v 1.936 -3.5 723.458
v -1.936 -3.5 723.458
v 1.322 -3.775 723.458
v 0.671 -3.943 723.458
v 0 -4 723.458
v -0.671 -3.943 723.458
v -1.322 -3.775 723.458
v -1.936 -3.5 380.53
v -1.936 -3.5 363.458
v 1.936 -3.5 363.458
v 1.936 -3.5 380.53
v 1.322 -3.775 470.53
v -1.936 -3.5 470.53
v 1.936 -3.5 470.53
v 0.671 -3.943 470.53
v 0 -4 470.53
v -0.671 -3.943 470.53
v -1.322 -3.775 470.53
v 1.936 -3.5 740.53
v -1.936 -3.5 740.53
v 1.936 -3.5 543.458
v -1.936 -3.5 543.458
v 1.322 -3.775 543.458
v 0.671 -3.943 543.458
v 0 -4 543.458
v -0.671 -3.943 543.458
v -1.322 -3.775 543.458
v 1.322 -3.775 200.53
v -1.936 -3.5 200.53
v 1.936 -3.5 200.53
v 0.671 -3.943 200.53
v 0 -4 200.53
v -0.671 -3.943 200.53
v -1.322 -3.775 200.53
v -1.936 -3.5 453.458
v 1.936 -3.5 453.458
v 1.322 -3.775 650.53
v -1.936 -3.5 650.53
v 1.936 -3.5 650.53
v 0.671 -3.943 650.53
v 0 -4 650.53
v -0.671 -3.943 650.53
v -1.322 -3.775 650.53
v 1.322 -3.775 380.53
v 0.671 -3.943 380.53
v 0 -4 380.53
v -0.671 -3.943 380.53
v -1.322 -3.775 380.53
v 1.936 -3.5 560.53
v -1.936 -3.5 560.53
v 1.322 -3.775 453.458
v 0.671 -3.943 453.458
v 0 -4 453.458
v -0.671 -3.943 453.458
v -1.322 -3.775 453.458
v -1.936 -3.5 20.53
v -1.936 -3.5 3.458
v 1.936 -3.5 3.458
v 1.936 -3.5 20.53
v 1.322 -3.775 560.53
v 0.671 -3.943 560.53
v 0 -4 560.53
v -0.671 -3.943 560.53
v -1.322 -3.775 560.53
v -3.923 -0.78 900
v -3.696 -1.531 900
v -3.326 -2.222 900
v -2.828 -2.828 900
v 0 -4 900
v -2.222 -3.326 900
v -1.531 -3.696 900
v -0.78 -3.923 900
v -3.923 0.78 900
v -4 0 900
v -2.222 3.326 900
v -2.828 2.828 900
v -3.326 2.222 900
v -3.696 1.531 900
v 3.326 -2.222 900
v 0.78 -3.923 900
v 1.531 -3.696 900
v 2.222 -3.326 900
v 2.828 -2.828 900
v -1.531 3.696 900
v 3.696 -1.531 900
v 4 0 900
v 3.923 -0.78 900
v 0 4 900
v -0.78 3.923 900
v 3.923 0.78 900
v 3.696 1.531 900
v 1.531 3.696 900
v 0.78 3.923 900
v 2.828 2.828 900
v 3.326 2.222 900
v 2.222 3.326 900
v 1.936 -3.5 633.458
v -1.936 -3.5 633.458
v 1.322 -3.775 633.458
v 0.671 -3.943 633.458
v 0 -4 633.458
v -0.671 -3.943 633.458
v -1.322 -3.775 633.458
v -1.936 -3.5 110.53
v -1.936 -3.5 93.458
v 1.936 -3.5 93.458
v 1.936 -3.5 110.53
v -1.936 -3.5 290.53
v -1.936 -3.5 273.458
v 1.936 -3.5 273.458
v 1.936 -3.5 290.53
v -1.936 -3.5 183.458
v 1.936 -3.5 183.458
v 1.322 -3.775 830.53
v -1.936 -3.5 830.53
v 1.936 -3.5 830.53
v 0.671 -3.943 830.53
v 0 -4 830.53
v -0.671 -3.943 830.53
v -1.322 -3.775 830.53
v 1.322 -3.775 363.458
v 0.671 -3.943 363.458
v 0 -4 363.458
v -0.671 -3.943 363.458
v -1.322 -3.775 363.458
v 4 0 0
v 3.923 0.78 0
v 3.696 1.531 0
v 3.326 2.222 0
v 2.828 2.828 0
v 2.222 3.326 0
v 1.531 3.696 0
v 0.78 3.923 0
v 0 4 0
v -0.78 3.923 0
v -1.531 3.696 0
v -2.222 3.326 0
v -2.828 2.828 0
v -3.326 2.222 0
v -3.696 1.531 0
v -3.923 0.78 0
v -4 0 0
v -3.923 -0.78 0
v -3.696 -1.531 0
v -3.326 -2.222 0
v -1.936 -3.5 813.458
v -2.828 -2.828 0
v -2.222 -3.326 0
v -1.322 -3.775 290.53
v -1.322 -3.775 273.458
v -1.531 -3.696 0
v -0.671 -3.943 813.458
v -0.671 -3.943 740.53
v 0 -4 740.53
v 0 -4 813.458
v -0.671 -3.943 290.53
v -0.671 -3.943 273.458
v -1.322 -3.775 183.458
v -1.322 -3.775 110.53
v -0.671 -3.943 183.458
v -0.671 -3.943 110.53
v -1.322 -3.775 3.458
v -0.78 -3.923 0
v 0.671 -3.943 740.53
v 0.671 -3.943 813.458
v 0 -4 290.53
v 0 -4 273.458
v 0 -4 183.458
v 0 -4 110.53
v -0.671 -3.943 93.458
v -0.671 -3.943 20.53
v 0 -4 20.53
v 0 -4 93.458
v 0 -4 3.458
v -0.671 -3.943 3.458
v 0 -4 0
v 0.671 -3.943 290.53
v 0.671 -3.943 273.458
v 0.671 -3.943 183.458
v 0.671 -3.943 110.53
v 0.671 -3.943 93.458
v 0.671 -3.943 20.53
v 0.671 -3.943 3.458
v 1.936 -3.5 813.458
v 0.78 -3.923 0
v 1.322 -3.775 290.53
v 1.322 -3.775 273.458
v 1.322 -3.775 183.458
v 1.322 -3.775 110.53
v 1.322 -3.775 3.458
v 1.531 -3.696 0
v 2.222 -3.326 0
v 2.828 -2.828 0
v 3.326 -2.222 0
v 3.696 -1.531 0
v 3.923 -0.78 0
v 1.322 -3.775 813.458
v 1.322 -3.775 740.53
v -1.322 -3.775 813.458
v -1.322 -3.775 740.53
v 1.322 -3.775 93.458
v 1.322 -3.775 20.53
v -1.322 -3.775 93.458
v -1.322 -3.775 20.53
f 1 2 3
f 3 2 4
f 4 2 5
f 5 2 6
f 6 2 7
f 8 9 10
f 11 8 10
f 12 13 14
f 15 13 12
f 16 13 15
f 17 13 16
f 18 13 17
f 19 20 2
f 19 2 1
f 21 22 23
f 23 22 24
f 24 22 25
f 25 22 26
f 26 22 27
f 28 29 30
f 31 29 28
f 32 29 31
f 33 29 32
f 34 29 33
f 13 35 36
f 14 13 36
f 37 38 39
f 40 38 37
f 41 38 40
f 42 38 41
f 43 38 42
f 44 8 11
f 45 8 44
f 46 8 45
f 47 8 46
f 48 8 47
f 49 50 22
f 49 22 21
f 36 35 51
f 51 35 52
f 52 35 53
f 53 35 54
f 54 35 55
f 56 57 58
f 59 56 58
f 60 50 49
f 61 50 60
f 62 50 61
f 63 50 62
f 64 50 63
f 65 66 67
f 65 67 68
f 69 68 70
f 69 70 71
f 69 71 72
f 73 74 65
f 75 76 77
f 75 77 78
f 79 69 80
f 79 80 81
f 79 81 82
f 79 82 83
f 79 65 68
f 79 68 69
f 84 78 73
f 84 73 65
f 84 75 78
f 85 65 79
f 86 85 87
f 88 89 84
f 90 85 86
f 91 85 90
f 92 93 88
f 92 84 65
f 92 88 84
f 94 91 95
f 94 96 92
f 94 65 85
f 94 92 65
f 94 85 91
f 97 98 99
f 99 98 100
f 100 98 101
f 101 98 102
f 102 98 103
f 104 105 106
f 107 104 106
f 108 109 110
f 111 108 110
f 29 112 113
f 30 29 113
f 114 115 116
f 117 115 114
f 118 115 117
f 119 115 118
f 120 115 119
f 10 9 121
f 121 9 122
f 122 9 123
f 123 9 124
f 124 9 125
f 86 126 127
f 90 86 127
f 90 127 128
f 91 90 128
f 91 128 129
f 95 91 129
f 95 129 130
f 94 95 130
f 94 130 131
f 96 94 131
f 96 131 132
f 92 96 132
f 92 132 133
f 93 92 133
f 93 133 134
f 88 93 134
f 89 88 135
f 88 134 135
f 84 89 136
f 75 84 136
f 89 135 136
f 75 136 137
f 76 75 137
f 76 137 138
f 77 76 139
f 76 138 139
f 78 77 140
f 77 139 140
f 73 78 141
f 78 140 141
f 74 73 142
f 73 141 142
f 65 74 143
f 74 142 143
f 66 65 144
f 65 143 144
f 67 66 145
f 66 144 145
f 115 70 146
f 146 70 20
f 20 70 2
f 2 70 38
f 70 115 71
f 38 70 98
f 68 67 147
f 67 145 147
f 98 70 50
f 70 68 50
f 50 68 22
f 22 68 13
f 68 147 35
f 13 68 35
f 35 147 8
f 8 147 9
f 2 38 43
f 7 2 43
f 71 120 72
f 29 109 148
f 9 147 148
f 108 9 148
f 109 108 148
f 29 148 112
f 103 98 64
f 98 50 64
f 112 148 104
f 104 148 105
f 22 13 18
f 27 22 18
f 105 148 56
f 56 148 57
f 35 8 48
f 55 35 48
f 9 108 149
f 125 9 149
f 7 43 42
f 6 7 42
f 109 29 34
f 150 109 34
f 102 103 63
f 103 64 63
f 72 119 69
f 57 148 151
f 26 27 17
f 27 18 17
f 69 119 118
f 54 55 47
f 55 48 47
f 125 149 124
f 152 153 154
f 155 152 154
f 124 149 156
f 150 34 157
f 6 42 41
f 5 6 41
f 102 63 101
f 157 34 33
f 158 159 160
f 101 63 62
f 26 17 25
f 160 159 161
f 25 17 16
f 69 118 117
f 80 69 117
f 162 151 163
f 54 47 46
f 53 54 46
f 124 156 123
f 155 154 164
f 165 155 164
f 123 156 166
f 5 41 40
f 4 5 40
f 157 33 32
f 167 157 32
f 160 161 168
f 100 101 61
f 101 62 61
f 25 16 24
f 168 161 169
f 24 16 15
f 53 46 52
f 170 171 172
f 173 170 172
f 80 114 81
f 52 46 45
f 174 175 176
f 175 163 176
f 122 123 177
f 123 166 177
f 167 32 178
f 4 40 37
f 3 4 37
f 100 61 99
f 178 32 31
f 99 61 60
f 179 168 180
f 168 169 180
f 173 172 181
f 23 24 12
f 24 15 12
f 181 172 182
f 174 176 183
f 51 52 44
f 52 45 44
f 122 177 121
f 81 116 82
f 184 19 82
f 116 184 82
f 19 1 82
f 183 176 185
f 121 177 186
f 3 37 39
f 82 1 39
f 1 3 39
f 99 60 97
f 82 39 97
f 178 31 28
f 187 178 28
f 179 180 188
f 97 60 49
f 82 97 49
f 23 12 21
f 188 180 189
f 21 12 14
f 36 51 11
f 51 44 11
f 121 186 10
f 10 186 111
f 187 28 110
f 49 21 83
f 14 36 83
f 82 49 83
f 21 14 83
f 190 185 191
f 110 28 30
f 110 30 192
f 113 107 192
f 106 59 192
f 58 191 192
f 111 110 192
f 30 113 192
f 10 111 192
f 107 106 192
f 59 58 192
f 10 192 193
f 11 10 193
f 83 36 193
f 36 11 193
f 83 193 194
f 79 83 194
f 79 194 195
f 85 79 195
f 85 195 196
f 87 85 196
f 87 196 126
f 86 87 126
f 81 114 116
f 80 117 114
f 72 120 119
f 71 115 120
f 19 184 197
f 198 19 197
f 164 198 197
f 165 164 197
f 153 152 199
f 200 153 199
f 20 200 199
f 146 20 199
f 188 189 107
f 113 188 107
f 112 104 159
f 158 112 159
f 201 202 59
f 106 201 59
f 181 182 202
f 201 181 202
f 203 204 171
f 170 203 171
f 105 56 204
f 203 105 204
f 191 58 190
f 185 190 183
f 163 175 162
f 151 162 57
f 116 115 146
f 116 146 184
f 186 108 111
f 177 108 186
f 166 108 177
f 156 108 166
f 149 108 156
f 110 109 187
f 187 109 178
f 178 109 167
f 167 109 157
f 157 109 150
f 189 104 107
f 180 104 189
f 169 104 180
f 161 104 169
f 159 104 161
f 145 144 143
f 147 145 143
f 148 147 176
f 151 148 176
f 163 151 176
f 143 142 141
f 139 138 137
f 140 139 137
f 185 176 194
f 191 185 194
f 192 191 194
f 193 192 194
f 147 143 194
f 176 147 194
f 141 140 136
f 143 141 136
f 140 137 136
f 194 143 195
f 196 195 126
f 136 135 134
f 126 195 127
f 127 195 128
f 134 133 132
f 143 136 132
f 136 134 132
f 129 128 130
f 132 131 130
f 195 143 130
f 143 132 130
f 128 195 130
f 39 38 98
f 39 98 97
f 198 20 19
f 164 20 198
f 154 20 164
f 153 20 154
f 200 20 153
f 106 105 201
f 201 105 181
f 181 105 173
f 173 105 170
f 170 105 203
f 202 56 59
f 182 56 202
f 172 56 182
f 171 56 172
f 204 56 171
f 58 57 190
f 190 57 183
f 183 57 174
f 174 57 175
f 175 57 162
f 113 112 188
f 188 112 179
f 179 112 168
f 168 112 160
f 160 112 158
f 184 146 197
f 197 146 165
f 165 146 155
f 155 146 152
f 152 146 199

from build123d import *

# Parameters (mm, degrees)
SKETCH1_R           = 4
BOSS_EXTRUDE1_DEPTH = 900
CUT_EXTRUDE1_START  = -3.5
SKETCH2_W           = 5.340885048
SKETCH2_H           = 17.071757563
CUT_EXTRUDE1_DEPTH  = 10


with BuildPart() as part:
    # Sketch1 → Boss-Extrude1 (new body)
    with BuildSketch(Plane.XY):
        Circle(SKETCH1_R)
    extrude(amount=BOSS_EXTRUDE1_DEPTH)

    # Sketch2 → Cut-Extrude1 (cut)
    with BuildSketch(Plane(origin=(0, 0, 0), x_dir=(1, 0, 0), z_dir=(0, 1, 0)).offset(CUT_EXTRUDE1_START)):
        with Locations((-0.042815547, -101.994282838)):
            Rectangle(SKETCH2_W, SKETCH2_H)
        with Locations((-0.042815547, -11.994282838)):
            Rectangle(SKETCH2_W, SKETCH2_H)
        with Locations((-0.042815547, -191.994282838)):
            Rectangle(SKETCH2_W, SKETCH2_H)
        with Locations((-0.042815547, -281.994282838)):
            Rectangle(SKETCH2_W, SKETCH2_H)
        with Locations((-0.042815547, -371.994282838)):
            Rectangle(SKETCH2_W, SKETCH2_H)
        with Locations((-0.042815547, -461.994282838)):
            Rectangle(SKETCH2_W, SKETCH2_H)
        with Locations((-0.042815547, -551.994282838)):
            Rectangle(SKETCH2_W, SKETCH2_H)
        with Locations((-0.042815547, -641.994282838)):
            Rectangle(SKETCH2_W, SKETCH2_H)
        with Locations((-0.042815547, -731.994282838)):
            Rectangle(SKETCH2_W, SKETCH2_H)
        with Locations((-0.042815547, -821.994282838)):
            Rectangle(SKETCH2_W, SKETCH2_H)
    extrude(amount=-CUT_EXTRUDE1_DEPTH, mode=Mode.SUBTRACT)


solid = part.part
